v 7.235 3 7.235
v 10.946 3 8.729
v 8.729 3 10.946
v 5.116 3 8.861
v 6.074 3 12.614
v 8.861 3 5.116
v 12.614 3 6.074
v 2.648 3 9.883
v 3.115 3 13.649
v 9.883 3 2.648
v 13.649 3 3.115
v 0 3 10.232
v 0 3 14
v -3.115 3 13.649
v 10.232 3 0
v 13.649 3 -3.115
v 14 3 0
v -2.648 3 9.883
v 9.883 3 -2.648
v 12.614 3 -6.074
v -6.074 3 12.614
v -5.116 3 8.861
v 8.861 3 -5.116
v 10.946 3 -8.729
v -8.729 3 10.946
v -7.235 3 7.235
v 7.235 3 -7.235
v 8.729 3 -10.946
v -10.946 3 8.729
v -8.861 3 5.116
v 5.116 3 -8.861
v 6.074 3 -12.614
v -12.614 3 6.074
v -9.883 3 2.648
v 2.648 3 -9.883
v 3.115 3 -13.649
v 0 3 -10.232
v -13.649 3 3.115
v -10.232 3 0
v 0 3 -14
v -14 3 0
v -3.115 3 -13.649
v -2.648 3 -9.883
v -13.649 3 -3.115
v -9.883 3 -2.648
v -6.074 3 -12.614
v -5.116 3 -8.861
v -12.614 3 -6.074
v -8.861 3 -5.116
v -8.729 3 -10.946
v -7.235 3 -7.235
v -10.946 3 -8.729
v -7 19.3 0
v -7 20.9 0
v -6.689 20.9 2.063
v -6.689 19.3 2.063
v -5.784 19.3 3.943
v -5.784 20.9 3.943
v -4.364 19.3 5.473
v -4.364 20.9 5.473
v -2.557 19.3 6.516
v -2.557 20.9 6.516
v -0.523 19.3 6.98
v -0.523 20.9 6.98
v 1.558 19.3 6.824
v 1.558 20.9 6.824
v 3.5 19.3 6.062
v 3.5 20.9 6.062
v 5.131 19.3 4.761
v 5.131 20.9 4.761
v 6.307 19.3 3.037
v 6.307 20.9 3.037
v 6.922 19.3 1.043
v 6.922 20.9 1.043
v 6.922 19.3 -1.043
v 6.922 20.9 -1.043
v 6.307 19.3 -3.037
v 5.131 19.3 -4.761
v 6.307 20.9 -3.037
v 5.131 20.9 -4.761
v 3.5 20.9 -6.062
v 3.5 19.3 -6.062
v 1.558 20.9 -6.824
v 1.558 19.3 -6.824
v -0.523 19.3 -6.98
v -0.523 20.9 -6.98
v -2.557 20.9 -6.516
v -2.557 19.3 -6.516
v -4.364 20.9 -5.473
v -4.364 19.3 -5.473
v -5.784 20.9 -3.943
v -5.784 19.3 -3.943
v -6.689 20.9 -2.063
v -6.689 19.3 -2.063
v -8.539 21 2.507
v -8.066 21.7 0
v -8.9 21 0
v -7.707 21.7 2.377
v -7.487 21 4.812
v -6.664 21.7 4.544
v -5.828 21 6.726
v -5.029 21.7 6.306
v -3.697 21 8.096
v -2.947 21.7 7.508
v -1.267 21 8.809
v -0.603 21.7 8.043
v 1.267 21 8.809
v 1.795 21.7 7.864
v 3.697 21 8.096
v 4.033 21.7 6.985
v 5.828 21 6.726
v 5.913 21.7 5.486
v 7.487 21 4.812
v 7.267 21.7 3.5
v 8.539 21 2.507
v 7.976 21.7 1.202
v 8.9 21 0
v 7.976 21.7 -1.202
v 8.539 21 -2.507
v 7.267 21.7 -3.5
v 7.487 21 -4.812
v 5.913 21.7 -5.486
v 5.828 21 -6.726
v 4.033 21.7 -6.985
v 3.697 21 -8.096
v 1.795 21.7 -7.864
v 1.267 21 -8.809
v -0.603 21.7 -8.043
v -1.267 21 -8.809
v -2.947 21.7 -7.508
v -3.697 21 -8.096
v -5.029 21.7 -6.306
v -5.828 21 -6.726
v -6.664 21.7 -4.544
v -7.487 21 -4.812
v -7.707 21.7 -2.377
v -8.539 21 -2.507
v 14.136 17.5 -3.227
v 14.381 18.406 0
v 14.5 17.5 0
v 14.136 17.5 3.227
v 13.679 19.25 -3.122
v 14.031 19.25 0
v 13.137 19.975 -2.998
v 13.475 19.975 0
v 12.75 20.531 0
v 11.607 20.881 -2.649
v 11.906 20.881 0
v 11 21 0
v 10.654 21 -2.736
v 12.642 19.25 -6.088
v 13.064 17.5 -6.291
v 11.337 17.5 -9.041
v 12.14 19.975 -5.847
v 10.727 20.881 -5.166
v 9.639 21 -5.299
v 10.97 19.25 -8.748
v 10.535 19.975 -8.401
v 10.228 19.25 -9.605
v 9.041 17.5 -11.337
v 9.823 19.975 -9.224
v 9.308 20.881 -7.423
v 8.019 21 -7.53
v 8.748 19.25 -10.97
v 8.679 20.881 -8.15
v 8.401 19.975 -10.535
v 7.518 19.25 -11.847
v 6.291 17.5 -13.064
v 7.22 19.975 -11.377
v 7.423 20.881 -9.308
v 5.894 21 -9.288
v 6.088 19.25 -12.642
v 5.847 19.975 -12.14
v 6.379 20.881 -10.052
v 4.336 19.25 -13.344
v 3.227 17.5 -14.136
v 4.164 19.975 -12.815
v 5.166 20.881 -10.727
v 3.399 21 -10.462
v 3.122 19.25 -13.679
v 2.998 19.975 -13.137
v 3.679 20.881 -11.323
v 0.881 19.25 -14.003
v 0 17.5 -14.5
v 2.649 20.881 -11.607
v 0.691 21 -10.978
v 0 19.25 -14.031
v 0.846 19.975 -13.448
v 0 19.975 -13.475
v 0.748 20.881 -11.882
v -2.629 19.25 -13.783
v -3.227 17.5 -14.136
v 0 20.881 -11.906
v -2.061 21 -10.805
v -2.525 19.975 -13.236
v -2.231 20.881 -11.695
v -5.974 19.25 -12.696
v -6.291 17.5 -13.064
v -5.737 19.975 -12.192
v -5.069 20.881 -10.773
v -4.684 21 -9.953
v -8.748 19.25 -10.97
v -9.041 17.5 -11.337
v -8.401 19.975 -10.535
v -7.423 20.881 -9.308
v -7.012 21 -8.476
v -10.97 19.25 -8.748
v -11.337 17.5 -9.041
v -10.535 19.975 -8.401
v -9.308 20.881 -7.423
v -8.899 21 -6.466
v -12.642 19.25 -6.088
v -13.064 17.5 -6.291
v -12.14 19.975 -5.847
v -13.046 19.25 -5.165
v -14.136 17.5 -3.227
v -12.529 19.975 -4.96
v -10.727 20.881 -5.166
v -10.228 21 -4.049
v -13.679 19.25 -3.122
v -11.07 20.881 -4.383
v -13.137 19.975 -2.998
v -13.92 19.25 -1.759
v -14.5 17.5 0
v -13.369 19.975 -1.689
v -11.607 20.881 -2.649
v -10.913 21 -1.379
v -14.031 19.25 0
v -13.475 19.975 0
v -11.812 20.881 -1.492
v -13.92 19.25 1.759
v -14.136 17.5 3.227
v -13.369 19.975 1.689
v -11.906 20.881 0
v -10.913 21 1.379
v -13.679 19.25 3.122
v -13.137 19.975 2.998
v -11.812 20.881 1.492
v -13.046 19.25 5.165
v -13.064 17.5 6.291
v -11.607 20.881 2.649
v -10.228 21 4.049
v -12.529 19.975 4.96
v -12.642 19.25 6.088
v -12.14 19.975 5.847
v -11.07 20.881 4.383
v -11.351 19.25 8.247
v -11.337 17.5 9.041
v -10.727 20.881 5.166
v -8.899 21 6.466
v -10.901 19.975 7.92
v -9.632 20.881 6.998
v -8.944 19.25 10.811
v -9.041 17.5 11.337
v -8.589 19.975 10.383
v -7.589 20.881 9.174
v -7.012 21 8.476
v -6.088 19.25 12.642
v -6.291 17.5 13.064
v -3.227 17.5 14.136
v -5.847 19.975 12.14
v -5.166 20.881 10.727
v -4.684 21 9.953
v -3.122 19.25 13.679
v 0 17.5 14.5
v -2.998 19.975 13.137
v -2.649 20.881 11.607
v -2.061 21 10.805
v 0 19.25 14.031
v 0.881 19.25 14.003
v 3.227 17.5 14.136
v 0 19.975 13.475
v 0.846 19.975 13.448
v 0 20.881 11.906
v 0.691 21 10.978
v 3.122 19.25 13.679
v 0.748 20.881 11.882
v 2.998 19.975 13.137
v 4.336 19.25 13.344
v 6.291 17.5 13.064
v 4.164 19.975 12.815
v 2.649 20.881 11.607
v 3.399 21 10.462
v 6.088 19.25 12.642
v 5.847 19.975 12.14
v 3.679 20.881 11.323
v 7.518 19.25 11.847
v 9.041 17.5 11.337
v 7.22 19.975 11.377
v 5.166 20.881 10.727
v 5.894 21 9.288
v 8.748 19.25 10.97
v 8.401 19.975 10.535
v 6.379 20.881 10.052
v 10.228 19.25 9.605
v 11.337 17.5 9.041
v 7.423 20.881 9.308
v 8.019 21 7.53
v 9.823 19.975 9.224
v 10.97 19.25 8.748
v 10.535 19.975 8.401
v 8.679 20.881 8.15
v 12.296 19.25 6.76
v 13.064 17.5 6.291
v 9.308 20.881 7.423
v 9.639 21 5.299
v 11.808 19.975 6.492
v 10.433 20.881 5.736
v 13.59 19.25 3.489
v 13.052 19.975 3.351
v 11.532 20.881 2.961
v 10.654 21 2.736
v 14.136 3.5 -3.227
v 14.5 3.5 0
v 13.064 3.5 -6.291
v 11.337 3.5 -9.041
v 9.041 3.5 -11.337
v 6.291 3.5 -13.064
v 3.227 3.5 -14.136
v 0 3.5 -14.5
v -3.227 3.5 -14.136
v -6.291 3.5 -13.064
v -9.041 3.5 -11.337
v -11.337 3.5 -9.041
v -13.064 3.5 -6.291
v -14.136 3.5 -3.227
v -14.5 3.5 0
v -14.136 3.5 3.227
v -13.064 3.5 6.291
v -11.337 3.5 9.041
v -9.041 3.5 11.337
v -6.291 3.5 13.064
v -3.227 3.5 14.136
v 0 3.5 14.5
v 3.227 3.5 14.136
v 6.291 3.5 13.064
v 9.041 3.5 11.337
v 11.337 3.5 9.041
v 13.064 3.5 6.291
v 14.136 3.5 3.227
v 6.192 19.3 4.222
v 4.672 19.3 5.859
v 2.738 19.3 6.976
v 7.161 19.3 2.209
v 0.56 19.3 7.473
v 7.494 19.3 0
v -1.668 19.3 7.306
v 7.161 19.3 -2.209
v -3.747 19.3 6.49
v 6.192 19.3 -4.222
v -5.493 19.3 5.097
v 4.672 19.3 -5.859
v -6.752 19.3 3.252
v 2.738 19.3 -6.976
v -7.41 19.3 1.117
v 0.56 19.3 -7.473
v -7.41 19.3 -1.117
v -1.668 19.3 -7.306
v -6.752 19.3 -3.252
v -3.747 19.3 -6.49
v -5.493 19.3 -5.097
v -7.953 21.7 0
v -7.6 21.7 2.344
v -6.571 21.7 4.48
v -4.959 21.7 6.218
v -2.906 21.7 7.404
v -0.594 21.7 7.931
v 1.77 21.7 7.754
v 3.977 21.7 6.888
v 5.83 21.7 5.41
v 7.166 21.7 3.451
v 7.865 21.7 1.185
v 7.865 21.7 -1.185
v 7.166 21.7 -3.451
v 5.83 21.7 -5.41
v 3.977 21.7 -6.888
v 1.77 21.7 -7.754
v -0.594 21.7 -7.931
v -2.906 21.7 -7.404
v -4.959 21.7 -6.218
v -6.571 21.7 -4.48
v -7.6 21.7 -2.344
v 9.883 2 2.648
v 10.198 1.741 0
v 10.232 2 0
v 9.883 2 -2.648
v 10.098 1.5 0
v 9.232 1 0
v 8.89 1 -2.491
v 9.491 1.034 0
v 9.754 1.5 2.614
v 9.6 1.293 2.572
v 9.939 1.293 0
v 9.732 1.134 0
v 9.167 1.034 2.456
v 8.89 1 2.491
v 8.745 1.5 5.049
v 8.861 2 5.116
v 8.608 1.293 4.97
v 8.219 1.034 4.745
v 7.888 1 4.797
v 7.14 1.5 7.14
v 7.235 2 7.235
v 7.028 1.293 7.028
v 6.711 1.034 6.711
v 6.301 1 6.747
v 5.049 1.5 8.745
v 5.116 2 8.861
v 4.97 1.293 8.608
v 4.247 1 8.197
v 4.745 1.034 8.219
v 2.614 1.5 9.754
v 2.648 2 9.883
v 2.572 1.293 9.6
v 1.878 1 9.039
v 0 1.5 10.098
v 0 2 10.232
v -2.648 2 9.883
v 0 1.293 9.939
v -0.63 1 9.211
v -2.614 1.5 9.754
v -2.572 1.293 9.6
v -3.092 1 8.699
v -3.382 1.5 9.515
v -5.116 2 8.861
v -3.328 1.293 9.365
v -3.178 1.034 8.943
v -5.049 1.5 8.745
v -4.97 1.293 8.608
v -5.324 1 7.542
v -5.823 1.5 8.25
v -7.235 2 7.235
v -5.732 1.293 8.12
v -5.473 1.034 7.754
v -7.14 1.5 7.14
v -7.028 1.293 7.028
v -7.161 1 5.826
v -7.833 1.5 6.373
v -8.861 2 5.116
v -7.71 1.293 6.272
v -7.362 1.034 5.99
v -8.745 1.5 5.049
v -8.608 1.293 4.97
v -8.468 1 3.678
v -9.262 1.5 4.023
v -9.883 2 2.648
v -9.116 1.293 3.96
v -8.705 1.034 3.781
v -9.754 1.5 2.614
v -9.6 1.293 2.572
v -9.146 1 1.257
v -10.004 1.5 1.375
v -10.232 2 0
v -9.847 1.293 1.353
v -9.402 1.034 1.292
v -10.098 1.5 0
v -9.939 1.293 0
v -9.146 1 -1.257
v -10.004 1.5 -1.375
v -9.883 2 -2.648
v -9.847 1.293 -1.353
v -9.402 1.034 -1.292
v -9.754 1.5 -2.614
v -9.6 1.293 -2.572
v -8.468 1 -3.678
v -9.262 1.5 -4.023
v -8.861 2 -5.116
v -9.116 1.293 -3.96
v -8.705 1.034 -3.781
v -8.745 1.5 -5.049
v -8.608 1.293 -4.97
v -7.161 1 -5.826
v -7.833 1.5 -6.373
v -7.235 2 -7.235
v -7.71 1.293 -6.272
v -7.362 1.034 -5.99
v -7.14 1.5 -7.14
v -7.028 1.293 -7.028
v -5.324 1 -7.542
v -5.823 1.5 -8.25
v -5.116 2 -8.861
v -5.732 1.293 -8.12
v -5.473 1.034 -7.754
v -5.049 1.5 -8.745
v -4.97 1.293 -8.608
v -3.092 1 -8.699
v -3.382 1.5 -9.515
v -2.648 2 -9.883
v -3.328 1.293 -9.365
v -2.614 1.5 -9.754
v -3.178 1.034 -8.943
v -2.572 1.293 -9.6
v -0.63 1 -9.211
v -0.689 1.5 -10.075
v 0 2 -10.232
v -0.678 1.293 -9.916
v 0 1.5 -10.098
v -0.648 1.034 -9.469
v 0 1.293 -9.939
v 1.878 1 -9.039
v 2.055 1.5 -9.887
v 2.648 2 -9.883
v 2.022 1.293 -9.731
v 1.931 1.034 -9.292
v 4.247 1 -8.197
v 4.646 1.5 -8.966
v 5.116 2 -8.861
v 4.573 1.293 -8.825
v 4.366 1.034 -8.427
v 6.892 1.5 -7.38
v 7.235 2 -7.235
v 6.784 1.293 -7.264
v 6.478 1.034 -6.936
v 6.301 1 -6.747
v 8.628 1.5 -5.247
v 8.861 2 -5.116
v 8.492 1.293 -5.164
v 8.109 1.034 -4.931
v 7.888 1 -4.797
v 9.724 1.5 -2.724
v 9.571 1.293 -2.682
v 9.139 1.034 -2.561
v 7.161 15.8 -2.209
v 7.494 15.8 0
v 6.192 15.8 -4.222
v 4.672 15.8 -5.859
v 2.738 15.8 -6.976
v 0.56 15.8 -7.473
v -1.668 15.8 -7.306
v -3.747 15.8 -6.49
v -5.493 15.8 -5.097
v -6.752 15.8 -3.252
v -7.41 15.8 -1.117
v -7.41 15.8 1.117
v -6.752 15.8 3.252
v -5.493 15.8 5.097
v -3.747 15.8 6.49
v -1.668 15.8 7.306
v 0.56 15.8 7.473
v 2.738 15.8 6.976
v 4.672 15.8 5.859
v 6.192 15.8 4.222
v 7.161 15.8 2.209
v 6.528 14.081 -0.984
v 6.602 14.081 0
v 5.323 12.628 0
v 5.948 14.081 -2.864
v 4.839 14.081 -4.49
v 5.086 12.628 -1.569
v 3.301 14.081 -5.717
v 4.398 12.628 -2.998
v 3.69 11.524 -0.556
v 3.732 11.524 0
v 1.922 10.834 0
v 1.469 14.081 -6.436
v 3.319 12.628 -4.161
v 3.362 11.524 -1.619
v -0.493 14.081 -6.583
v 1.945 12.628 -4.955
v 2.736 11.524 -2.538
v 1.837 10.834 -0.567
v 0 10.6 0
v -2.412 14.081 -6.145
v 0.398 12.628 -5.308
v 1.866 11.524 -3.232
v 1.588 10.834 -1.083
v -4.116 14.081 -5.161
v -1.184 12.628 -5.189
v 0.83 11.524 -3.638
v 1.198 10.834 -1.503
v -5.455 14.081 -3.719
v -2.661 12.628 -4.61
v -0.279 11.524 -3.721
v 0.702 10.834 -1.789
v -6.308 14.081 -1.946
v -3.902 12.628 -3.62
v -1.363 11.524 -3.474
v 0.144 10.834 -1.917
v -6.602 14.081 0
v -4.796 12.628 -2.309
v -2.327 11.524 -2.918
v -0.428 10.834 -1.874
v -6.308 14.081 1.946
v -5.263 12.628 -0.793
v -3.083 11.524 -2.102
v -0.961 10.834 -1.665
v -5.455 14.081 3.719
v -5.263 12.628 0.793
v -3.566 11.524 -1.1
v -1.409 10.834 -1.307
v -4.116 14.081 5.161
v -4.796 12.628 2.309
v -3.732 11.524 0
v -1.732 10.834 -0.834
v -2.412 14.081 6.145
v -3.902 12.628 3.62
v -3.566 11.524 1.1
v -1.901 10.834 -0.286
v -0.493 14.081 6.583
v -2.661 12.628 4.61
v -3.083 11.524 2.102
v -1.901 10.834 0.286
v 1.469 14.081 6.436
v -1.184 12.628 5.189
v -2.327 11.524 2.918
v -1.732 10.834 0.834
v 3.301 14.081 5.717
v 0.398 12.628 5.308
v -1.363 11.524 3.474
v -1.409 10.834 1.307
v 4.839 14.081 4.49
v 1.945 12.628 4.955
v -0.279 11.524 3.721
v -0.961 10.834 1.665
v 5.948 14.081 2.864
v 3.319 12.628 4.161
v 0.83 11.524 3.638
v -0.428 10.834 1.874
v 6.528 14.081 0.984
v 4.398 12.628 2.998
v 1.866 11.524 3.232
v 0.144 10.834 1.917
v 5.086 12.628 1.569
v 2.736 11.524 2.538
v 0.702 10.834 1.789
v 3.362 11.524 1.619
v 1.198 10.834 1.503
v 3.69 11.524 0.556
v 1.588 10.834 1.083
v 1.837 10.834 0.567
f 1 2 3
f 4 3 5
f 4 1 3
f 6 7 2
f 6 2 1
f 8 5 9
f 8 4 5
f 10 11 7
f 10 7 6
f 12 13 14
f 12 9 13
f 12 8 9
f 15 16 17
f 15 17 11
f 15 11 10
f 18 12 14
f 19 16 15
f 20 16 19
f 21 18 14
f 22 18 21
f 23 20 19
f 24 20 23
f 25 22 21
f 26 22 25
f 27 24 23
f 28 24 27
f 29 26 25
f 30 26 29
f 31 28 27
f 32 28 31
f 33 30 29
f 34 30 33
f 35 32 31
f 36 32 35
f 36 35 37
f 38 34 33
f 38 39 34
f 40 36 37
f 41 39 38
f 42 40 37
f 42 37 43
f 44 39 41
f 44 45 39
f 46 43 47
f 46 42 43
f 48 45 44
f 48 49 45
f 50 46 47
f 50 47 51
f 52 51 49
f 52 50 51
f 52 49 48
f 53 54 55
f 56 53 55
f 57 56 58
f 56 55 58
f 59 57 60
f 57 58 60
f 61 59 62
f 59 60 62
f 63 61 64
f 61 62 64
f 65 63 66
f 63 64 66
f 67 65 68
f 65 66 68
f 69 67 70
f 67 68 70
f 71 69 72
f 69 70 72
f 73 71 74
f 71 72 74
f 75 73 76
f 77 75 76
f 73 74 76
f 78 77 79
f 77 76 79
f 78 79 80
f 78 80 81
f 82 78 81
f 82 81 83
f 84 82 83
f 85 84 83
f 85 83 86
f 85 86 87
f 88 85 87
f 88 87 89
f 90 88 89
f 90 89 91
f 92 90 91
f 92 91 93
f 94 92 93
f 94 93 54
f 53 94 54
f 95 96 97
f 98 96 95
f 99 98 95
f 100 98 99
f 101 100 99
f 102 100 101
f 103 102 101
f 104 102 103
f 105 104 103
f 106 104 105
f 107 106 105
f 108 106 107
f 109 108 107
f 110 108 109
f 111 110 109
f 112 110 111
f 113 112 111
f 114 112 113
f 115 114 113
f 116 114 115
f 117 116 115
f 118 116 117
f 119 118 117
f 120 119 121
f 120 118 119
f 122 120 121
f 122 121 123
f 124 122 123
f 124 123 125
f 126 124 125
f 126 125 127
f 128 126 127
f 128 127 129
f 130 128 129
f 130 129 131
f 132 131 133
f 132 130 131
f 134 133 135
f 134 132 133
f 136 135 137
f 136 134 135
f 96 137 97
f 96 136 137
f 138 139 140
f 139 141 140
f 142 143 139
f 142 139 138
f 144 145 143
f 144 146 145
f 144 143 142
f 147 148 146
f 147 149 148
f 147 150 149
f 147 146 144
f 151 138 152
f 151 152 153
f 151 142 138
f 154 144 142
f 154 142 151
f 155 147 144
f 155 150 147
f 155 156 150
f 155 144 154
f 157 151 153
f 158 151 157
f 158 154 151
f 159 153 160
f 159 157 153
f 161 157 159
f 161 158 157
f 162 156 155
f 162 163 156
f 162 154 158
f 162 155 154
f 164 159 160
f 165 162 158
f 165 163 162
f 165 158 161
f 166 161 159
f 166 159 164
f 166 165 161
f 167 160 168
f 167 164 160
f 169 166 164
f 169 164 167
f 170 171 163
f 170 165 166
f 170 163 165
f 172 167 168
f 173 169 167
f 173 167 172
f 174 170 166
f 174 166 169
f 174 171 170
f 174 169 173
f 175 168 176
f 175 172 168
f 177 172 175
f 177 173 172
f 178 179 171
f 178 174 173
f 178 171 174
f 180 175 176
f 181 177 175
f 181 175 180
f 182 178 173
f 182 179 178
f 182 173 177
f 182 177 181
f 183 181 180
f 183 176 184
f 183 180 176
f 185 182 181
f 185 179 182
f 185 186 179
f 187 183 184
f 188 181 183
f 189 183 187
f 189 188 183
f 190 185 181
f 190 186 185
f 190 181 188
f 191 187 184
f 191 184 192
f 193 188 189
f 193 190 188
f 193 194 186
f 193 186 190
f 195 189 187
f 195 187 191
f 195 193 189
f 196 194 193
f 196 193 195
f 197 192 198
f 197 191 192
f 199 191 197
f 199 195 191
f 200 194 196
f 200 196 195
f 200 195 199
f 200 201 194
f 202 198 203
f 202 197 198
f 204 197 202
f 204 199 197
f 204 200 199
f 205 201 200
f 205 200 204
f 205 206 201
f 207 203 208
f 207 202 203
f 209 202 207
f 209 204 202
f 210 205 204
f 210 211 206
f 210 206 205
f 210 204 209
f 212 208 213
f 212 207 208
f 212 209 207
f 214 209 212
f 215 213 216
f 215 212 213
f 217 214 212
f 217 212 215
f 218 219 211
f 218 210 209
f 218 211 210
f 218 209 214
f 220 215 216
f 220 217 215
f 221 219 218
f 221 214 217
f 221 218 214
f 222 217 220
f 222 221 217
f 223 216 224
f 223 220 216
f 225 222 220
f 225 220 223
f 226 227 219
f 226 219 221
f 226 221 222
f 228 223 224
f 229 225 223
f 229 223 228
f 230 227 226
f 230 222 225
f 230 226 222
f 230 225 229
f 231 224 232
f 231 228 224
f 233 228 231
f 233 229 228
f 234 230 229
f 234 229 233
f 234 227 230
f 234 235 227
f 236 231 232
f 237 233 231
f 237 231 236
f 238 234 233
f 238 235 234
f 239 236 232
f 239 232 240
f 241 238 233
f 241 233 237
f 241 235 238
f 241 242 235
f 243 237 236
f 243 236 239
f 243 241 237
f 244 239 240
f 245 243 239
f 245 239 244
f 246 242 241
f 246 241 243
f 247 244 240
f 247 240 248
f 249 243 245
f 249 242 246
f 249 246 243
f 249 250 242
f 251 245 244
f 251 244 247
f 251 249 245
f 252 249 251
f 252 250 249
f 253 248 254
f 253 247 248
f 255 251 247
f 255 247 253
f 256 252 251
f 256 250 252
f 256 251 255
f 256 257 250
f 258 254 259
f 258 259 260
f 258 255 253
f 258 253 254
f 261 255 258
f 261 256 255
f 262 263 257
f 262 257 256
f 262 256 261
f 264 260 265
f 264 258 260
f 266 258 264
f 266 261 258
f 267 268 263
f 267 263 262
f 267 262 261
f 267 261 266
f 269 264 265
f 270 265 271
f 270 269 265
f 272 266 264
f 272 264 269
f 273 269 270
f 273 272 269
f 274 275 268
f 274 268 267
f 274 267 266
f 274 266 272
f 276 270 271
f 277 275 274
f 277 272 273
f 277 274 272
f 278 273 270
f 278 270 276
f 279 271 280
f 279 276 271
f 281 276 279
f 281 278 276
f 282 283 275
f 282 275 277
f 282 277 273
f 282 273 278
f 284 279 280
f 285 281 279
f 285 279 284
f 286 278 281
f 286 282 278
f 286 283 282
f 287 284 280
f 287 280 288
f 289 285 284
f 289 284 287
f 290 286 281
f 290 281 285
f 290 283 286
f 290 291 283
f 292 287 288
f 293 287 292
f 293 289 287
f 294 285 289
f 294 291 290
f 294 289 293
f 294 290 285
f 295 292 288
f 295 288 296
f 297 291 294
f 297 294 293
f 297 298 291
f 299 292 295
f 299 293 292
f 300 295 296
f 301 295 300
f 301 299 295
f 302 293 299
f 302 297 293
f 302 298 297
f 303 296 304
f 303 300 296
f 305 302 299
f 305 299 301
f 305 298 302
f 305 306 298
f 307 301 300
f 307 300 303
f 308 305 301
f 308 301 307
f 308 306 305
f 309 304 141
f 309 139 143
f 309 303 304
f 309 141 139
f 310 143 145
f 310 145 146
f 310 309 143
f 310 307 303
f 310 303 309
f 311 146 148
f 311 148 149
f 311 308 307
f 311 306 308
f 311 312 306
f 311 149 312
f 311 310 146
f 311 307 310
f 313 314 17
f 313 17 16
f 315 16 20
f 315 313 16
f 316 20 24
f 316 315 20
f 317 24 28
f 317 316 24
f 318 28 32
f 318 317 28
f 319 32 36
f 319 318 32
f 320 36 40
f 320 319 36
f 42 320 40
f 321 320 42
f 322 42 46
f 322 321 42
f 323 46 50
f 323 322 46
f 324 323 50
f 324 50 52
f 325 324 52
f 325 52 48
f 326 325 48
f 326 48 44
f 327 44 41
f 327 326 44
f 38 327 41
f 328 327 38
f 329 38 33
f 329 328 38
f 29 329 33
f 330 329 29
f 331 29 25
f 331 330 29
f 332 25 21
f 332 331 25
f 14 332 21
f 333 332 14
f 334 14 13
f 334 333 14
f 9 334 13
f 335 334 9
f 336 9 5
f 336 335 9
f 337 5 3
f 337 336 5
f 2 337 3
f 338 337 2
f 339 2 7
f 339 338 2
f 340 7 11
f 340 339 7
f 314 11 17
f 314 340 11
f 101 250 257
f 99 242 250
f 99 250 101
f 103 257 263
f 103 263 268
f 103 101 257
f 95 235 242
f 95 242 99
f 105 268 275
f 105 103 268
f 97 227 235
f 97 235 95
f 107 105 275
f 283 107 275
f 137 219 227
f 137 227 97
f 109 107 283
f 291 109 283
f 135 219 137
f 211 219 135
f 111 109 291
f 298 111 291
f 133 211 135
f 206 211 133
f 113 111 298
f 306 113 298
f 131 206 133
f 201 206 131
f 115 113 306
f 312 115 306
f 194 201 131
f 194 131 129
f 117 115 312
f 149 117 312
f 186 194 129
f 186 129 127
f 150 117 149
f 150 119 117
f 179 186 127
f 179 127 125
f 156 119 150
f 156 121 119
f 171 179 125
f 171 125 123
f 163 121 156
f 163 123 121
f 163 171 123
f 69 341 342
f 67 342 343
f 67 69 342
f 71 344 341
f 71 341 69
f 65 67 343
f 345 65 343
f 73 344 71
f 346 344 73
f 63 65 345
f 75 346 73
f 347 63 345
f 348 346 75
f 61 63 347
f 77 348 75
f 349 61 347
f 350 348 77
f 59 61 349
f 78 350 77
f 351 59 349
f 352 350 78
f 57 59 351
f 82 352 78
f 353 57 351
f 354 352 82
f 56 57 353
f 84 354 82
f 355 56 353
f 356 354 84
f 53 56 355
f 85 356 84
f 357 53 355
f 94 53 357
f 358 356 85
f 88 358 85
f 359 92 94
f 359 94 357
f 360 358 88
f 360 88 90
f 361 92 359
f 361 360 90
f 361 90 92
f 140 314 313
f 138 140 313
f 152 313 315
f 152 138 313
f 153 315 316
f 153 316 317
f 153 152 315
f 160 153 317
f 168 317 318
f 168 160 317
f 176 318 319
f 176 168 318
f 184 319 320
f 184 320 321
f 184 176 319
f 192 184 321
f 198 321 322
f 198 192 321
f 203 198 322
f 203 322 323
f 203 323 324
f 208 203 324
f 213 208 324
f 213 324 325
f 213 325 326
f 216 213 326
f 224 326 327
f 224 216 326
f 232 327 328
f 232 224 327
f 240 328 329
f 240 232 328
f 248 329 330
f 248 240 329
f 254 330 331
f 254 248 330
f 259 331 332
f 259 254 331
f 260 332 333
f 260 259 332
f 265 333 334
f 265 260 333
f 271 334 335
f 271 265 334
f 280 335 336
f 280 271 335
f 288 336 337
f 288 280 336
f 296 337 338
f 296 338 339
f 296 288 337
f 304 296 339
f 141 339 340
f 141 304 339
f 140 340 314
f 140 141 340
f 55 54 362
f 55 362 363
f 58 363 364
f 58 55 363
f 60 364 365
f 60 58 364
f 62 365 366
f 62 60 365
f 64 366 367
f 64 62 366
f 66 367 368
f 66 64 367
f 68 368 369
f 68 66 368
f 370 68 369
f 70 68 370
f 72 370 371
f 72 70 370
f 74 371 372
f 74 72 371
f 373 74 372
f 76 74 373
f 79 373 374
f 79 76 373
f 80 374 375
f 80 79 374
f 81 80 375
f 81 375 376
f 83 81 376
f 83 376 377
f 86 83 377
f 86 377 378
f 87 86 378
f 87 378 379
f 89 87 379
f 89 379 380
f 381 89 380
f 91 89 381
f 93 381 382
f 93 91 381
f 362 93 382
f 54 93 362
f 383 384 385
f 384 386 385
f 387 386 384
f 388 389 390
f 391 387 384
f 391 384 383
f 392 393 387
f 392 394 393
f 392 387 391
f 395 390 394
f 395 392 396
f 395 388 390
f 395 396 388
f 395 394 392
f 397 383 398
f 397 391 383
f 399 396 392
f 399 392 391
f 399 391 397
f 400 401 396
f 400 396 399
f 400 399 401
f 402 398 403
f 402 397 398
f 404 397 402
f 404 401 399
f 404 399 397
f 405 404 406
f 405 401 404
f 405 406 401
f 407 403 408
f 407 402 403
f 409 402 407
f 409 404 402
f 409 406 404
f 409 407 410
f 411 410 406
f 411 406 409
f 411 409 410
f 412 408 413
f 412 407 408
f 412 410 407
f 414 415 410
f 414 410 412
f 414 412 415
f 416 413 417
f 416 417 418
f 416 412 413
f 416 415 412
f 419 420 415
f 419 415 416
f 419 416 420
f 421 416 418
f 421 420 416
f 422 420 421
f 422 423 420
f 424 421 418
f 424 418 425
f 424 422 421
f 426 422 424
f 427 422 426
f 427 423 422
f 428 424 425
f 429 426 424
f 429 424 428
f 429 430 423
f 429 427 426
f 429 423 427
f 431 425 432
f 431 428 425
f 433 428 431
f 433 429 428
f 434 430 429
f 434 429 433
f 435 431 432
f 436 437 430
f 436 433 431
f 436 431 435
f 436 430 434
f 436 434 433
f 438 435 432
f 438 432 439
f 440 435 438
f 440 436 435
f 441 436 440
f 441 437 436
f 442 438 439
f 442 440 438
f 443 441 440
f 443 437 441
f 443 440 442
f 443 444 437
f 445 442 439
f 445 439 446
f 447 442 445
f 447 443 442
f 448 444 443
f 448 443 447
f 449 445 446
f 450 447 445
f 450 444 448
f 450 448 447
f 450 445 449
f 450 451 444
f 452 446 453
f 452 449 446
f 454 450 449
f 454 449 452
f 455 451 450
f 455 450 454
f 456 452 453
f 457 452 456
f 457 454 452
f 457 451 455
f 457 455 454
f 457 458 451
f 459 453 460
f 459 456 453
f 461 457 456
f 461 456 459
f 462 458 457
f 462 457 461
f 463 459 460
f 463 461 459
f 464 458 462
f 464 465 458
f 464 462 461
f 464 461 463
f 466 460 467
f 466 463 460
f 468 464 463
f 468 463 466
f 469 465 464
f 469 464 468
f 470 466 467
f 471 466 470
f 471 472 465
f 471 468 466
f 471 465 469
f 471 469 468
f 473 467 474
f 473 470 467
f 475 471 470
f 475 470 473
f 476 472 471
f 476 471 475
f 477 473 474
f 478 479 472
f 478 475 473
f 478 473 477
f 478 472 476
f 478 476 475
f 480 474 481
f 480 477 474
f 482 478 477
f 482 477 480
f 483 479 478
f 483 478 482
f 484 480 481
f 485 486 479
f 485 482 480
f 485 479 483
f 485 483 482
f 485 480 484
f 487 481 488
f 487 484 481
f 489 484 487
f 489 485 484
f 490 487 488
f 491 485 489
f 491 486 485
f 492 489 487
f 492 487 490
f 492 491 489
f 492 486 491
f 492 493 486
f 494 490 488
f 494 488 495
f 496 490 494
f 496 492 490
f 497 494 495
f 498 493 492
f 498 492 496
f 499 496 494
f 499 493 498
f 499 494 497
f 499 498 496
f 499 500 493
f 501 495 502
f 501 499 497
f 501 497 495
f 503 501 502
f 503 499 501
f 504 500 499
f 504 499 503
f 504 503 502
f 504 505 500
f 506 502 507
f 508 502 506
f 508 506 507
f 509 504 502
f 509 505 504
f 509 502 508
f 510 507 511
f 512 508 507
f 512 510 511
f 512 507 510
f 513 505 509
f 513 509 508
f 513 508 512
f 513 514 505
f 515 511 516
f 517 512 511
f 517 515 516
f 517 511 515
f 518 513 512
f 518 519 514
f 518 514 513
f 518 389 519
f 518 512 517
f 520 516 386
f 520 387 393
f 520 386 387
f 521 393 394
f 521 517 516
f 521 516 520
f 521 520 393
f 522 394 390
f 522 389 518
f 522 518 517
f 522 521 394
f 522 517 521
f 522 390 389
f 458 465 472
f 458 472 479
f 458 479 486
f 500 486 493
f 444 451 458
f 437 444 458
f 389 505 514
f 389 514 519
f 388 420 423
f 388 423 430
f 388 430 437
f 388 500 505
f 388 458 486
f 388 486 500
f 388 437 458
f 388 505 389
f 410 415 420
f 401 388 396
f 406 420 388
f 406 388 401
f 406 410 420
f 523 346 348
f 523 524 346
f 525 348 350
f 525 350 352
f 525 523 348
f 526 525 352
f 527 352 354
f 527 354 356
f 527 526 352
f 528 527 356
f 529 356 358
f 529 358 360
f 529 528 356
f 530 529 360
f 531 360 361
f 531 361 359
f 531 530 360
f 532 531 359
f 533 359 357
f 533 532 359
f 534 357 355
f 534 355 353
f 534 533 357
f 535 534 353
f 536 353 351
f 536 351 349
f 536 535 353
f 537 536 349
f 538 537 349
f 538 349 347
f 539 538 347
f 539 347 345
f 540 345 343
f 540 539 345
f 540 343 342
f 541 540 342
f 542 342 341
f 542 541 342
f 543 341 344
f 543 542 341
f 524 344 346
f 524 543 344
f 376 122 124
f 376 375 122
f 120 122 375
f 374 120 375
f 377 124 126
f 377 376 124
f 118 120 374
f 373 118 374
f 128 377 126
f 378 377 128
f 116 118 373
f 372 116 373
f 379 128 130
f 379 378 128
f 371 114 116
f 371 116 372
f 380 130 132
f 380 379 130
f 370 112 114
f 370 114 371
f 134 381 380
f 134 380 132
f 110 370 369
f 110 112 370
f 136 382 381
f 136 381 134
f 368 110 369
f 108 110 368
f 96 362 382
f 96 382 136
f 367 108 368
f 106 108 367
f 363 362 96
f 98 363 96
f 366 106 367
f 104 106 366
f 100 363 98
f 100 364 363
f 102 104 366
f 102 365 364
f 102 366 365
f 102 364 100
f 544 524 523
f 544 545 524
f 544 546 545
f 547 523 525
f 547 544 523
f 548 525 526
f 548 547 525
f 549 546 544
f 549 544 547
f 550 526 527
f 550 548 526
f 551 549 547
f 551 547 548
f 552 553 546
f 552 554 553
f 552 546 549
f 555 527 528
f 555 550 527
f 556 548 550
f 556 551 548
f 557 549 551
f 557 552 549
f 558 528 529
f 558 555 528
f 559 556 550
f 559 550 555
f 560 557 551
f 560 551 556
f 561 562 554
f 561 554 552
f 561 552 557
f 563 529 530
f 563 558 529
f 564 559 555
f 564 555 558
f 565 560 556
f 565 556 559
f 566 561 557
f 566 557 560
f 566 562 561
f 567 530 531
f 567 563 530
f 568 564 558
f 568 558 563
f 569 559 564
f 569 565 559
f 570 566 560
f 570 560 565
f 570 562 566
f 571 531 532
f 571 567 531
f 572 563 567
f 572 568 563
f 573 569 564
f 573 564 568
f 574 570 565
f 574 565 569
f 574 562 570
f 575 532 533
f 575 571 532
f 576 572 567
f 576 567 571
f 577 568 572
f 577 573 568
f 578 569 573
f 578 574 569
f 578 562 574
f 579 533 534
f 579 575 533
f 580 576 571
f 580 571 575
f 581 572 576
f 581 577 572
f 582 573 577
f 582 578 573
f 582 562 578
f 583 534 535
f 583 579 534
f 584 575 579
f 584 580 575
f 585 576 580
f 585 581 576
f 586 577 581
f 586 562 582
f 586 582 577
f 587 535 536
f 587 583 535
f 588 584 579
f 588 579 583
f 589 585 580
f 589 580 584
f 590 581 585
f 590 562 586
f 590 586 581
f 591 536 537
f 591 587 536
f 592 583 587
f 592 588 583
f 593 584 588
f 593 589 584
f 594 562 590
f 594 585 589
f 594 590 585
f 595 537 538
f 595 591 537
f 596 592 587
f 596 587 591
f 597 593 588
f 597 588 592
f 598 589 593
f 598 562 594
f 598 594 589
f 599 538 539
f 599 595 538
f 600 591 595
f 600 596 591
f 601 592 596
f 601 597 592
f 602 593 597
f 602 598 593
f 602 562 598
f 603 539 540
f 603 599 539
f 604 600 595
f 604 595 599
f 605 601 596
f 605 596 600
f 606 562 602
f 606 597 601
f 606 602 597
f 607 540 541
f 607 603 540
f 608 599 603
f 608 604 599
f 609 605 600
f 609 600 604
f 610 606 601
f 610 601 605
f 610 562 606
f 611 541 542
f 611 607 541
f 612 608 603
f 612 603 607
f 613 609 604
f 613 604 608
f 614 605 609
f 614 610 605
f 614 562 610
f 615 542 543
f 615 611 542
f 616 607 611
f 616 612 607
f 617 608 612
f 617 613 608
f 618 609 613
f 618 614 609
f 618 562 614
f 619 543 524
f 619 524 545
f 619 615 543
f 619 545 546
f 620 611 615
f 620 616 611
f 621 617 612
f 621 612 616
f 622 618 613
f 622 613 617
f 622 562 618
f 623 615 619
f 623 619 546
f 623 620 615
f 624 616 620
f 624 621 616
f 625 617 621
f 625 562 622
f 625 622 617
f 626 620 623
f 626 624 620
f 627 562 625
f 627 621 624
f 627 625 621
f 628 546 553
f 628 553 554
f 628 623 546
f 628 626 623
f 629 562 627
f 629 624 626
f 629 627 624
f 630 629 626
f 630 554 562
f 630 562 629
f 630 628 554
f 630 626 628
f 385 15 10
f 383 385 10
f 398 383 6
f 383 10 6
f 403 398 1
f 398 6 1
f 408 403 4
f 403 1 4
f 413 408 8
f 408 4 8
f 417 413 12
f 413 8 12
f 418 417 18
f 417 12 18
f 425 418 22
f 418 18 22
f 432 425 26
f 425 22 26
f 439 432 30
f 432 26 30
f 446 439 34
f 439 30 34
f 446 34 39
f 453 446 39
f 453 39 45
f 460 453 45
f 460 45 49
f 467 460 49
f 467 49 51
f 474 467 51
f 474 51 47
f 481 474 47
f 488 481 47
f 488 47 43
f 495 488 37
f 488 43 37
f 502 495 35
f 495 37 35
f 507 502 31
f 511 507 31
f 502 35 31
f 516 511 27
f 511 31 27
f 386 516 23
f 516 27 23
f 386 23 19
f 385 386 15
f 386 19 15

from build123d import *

# Parameters (mm, degrees)
SKETCH2_R                      = 8.9
BOSS_EXTRUDE1_DEPTH            = 0.7
BOSS_EXTRUDE1_TAPER            = 50
F_14_0_14_DIAMETER_HOLE1_D     = 14
F_14_0_14_DIAMETER_HOLE1_DEPTH = 2.4
SKETCH5_R                      = 10.232050808
BOSS_EXTRUDE2_DEPTH            = 2
CHAMFER1_SIZE                  = 0.5
CHAMFER2_SIZE                  = 0.953402874
CHAMFER2_SIZE2                 = 0.8
FILLET1_R                      = 1
FILLET2_R                      = 3.5


with BuildPart() as part:
    # Cut-Extrude1: read off the stored shape, not the designer's step
    # Cut-Extrude1 outline → Cut-Extrude1 (revolve)
    with BuildSketch(Plane.XY):
        with BuildLine():
            Line((0, 10.6), (0, 3))
            Line((0, 3), (14.5, 3))
            Line((14.5, 3), (14.5, 21))
            Line((14.5, 21), (0, 21))
            Line((0, 21), (0, 19.3))
            Line((0, 19.3), (7.493997598, 19.3))
            Line((7.493997598, 19.3), (7.493997598, 15.8))
            ThreePointArc((7.493997598, 15.8), (4.5607017, 12.02732931), (0, 10.6))
        make_face()
    revolve(axis=Axis((0, 0, 0), (0, 1, 0)))

    # Sketch2 → Boss-Extrude1 (add)
    with BuildSketch(Plane(origin=(0, 21, 0), x_dir=(-1, 0, 0), z_dir=(0, 1, 0))):
        Circle(SKETCH2_R)
    extrude(amount=BOSS_EXTRUDE1_DEPTH, taper=BOSS_EXTRUDE1_TAPER)

    # Ø14.0 (14) Diameter Hole1
    with Locations(Plane.XZ.offset(-19.3)):
        with Locations((0, 0)):
            Hole(F_14_0_14_DIAMETER_HOLE1_D / 2, depth=F_14_0_14_DIAMETER_HOLE1_DEPTH)

    # Sketch5 → Boss-Extrude2 (add)
    with BuildSketch(Plane.XZ.offset(-3)):
        Circle(SKETCH5_R)
    extrude(amount=BOSS_EXTRUDE2_DEPTH)

    # Chamfer1
    chamfer1_edges = [part.edges().sort_by_distance(p)[0] for p in [
        (-14.5, 3, 0),
    ]]
    chamfer(chamfer1_edges, length=CHAMFER1_SIZE)

    # Chamfer2
    chamfer2_edges = [part.edges().sort_by_distance(p)[0] for p in [
        (7, 21.7, 0),
    ]]
    chamfer2_side = [part.faces().sort_by_distance(p)[0] for p in [
        (7.837637988, 21.7, 0),
    ]]
    chamfer(chamfer2_edges, length=CHAMFER2_SIZE, length2=CHAMFER2_SIZE2, reference=chamfer2_side[0])

    # Fillet1
    fillet1_edges = [part.edges().sort_by_distance(p)[0] for p in [
        (-10.232050808, 1, 0),
    ]]
    fillet(fillet1_edges, radius=FILLET1_R)

    # Fillet2
    fillet2_edges = [part.edges().sort_by_distance(p)[0] for p in [
        (-14.5, 21, 0),
    ]]
    fillet(fillet2_edges, radius=FILLET2_R)


solid = part.part
